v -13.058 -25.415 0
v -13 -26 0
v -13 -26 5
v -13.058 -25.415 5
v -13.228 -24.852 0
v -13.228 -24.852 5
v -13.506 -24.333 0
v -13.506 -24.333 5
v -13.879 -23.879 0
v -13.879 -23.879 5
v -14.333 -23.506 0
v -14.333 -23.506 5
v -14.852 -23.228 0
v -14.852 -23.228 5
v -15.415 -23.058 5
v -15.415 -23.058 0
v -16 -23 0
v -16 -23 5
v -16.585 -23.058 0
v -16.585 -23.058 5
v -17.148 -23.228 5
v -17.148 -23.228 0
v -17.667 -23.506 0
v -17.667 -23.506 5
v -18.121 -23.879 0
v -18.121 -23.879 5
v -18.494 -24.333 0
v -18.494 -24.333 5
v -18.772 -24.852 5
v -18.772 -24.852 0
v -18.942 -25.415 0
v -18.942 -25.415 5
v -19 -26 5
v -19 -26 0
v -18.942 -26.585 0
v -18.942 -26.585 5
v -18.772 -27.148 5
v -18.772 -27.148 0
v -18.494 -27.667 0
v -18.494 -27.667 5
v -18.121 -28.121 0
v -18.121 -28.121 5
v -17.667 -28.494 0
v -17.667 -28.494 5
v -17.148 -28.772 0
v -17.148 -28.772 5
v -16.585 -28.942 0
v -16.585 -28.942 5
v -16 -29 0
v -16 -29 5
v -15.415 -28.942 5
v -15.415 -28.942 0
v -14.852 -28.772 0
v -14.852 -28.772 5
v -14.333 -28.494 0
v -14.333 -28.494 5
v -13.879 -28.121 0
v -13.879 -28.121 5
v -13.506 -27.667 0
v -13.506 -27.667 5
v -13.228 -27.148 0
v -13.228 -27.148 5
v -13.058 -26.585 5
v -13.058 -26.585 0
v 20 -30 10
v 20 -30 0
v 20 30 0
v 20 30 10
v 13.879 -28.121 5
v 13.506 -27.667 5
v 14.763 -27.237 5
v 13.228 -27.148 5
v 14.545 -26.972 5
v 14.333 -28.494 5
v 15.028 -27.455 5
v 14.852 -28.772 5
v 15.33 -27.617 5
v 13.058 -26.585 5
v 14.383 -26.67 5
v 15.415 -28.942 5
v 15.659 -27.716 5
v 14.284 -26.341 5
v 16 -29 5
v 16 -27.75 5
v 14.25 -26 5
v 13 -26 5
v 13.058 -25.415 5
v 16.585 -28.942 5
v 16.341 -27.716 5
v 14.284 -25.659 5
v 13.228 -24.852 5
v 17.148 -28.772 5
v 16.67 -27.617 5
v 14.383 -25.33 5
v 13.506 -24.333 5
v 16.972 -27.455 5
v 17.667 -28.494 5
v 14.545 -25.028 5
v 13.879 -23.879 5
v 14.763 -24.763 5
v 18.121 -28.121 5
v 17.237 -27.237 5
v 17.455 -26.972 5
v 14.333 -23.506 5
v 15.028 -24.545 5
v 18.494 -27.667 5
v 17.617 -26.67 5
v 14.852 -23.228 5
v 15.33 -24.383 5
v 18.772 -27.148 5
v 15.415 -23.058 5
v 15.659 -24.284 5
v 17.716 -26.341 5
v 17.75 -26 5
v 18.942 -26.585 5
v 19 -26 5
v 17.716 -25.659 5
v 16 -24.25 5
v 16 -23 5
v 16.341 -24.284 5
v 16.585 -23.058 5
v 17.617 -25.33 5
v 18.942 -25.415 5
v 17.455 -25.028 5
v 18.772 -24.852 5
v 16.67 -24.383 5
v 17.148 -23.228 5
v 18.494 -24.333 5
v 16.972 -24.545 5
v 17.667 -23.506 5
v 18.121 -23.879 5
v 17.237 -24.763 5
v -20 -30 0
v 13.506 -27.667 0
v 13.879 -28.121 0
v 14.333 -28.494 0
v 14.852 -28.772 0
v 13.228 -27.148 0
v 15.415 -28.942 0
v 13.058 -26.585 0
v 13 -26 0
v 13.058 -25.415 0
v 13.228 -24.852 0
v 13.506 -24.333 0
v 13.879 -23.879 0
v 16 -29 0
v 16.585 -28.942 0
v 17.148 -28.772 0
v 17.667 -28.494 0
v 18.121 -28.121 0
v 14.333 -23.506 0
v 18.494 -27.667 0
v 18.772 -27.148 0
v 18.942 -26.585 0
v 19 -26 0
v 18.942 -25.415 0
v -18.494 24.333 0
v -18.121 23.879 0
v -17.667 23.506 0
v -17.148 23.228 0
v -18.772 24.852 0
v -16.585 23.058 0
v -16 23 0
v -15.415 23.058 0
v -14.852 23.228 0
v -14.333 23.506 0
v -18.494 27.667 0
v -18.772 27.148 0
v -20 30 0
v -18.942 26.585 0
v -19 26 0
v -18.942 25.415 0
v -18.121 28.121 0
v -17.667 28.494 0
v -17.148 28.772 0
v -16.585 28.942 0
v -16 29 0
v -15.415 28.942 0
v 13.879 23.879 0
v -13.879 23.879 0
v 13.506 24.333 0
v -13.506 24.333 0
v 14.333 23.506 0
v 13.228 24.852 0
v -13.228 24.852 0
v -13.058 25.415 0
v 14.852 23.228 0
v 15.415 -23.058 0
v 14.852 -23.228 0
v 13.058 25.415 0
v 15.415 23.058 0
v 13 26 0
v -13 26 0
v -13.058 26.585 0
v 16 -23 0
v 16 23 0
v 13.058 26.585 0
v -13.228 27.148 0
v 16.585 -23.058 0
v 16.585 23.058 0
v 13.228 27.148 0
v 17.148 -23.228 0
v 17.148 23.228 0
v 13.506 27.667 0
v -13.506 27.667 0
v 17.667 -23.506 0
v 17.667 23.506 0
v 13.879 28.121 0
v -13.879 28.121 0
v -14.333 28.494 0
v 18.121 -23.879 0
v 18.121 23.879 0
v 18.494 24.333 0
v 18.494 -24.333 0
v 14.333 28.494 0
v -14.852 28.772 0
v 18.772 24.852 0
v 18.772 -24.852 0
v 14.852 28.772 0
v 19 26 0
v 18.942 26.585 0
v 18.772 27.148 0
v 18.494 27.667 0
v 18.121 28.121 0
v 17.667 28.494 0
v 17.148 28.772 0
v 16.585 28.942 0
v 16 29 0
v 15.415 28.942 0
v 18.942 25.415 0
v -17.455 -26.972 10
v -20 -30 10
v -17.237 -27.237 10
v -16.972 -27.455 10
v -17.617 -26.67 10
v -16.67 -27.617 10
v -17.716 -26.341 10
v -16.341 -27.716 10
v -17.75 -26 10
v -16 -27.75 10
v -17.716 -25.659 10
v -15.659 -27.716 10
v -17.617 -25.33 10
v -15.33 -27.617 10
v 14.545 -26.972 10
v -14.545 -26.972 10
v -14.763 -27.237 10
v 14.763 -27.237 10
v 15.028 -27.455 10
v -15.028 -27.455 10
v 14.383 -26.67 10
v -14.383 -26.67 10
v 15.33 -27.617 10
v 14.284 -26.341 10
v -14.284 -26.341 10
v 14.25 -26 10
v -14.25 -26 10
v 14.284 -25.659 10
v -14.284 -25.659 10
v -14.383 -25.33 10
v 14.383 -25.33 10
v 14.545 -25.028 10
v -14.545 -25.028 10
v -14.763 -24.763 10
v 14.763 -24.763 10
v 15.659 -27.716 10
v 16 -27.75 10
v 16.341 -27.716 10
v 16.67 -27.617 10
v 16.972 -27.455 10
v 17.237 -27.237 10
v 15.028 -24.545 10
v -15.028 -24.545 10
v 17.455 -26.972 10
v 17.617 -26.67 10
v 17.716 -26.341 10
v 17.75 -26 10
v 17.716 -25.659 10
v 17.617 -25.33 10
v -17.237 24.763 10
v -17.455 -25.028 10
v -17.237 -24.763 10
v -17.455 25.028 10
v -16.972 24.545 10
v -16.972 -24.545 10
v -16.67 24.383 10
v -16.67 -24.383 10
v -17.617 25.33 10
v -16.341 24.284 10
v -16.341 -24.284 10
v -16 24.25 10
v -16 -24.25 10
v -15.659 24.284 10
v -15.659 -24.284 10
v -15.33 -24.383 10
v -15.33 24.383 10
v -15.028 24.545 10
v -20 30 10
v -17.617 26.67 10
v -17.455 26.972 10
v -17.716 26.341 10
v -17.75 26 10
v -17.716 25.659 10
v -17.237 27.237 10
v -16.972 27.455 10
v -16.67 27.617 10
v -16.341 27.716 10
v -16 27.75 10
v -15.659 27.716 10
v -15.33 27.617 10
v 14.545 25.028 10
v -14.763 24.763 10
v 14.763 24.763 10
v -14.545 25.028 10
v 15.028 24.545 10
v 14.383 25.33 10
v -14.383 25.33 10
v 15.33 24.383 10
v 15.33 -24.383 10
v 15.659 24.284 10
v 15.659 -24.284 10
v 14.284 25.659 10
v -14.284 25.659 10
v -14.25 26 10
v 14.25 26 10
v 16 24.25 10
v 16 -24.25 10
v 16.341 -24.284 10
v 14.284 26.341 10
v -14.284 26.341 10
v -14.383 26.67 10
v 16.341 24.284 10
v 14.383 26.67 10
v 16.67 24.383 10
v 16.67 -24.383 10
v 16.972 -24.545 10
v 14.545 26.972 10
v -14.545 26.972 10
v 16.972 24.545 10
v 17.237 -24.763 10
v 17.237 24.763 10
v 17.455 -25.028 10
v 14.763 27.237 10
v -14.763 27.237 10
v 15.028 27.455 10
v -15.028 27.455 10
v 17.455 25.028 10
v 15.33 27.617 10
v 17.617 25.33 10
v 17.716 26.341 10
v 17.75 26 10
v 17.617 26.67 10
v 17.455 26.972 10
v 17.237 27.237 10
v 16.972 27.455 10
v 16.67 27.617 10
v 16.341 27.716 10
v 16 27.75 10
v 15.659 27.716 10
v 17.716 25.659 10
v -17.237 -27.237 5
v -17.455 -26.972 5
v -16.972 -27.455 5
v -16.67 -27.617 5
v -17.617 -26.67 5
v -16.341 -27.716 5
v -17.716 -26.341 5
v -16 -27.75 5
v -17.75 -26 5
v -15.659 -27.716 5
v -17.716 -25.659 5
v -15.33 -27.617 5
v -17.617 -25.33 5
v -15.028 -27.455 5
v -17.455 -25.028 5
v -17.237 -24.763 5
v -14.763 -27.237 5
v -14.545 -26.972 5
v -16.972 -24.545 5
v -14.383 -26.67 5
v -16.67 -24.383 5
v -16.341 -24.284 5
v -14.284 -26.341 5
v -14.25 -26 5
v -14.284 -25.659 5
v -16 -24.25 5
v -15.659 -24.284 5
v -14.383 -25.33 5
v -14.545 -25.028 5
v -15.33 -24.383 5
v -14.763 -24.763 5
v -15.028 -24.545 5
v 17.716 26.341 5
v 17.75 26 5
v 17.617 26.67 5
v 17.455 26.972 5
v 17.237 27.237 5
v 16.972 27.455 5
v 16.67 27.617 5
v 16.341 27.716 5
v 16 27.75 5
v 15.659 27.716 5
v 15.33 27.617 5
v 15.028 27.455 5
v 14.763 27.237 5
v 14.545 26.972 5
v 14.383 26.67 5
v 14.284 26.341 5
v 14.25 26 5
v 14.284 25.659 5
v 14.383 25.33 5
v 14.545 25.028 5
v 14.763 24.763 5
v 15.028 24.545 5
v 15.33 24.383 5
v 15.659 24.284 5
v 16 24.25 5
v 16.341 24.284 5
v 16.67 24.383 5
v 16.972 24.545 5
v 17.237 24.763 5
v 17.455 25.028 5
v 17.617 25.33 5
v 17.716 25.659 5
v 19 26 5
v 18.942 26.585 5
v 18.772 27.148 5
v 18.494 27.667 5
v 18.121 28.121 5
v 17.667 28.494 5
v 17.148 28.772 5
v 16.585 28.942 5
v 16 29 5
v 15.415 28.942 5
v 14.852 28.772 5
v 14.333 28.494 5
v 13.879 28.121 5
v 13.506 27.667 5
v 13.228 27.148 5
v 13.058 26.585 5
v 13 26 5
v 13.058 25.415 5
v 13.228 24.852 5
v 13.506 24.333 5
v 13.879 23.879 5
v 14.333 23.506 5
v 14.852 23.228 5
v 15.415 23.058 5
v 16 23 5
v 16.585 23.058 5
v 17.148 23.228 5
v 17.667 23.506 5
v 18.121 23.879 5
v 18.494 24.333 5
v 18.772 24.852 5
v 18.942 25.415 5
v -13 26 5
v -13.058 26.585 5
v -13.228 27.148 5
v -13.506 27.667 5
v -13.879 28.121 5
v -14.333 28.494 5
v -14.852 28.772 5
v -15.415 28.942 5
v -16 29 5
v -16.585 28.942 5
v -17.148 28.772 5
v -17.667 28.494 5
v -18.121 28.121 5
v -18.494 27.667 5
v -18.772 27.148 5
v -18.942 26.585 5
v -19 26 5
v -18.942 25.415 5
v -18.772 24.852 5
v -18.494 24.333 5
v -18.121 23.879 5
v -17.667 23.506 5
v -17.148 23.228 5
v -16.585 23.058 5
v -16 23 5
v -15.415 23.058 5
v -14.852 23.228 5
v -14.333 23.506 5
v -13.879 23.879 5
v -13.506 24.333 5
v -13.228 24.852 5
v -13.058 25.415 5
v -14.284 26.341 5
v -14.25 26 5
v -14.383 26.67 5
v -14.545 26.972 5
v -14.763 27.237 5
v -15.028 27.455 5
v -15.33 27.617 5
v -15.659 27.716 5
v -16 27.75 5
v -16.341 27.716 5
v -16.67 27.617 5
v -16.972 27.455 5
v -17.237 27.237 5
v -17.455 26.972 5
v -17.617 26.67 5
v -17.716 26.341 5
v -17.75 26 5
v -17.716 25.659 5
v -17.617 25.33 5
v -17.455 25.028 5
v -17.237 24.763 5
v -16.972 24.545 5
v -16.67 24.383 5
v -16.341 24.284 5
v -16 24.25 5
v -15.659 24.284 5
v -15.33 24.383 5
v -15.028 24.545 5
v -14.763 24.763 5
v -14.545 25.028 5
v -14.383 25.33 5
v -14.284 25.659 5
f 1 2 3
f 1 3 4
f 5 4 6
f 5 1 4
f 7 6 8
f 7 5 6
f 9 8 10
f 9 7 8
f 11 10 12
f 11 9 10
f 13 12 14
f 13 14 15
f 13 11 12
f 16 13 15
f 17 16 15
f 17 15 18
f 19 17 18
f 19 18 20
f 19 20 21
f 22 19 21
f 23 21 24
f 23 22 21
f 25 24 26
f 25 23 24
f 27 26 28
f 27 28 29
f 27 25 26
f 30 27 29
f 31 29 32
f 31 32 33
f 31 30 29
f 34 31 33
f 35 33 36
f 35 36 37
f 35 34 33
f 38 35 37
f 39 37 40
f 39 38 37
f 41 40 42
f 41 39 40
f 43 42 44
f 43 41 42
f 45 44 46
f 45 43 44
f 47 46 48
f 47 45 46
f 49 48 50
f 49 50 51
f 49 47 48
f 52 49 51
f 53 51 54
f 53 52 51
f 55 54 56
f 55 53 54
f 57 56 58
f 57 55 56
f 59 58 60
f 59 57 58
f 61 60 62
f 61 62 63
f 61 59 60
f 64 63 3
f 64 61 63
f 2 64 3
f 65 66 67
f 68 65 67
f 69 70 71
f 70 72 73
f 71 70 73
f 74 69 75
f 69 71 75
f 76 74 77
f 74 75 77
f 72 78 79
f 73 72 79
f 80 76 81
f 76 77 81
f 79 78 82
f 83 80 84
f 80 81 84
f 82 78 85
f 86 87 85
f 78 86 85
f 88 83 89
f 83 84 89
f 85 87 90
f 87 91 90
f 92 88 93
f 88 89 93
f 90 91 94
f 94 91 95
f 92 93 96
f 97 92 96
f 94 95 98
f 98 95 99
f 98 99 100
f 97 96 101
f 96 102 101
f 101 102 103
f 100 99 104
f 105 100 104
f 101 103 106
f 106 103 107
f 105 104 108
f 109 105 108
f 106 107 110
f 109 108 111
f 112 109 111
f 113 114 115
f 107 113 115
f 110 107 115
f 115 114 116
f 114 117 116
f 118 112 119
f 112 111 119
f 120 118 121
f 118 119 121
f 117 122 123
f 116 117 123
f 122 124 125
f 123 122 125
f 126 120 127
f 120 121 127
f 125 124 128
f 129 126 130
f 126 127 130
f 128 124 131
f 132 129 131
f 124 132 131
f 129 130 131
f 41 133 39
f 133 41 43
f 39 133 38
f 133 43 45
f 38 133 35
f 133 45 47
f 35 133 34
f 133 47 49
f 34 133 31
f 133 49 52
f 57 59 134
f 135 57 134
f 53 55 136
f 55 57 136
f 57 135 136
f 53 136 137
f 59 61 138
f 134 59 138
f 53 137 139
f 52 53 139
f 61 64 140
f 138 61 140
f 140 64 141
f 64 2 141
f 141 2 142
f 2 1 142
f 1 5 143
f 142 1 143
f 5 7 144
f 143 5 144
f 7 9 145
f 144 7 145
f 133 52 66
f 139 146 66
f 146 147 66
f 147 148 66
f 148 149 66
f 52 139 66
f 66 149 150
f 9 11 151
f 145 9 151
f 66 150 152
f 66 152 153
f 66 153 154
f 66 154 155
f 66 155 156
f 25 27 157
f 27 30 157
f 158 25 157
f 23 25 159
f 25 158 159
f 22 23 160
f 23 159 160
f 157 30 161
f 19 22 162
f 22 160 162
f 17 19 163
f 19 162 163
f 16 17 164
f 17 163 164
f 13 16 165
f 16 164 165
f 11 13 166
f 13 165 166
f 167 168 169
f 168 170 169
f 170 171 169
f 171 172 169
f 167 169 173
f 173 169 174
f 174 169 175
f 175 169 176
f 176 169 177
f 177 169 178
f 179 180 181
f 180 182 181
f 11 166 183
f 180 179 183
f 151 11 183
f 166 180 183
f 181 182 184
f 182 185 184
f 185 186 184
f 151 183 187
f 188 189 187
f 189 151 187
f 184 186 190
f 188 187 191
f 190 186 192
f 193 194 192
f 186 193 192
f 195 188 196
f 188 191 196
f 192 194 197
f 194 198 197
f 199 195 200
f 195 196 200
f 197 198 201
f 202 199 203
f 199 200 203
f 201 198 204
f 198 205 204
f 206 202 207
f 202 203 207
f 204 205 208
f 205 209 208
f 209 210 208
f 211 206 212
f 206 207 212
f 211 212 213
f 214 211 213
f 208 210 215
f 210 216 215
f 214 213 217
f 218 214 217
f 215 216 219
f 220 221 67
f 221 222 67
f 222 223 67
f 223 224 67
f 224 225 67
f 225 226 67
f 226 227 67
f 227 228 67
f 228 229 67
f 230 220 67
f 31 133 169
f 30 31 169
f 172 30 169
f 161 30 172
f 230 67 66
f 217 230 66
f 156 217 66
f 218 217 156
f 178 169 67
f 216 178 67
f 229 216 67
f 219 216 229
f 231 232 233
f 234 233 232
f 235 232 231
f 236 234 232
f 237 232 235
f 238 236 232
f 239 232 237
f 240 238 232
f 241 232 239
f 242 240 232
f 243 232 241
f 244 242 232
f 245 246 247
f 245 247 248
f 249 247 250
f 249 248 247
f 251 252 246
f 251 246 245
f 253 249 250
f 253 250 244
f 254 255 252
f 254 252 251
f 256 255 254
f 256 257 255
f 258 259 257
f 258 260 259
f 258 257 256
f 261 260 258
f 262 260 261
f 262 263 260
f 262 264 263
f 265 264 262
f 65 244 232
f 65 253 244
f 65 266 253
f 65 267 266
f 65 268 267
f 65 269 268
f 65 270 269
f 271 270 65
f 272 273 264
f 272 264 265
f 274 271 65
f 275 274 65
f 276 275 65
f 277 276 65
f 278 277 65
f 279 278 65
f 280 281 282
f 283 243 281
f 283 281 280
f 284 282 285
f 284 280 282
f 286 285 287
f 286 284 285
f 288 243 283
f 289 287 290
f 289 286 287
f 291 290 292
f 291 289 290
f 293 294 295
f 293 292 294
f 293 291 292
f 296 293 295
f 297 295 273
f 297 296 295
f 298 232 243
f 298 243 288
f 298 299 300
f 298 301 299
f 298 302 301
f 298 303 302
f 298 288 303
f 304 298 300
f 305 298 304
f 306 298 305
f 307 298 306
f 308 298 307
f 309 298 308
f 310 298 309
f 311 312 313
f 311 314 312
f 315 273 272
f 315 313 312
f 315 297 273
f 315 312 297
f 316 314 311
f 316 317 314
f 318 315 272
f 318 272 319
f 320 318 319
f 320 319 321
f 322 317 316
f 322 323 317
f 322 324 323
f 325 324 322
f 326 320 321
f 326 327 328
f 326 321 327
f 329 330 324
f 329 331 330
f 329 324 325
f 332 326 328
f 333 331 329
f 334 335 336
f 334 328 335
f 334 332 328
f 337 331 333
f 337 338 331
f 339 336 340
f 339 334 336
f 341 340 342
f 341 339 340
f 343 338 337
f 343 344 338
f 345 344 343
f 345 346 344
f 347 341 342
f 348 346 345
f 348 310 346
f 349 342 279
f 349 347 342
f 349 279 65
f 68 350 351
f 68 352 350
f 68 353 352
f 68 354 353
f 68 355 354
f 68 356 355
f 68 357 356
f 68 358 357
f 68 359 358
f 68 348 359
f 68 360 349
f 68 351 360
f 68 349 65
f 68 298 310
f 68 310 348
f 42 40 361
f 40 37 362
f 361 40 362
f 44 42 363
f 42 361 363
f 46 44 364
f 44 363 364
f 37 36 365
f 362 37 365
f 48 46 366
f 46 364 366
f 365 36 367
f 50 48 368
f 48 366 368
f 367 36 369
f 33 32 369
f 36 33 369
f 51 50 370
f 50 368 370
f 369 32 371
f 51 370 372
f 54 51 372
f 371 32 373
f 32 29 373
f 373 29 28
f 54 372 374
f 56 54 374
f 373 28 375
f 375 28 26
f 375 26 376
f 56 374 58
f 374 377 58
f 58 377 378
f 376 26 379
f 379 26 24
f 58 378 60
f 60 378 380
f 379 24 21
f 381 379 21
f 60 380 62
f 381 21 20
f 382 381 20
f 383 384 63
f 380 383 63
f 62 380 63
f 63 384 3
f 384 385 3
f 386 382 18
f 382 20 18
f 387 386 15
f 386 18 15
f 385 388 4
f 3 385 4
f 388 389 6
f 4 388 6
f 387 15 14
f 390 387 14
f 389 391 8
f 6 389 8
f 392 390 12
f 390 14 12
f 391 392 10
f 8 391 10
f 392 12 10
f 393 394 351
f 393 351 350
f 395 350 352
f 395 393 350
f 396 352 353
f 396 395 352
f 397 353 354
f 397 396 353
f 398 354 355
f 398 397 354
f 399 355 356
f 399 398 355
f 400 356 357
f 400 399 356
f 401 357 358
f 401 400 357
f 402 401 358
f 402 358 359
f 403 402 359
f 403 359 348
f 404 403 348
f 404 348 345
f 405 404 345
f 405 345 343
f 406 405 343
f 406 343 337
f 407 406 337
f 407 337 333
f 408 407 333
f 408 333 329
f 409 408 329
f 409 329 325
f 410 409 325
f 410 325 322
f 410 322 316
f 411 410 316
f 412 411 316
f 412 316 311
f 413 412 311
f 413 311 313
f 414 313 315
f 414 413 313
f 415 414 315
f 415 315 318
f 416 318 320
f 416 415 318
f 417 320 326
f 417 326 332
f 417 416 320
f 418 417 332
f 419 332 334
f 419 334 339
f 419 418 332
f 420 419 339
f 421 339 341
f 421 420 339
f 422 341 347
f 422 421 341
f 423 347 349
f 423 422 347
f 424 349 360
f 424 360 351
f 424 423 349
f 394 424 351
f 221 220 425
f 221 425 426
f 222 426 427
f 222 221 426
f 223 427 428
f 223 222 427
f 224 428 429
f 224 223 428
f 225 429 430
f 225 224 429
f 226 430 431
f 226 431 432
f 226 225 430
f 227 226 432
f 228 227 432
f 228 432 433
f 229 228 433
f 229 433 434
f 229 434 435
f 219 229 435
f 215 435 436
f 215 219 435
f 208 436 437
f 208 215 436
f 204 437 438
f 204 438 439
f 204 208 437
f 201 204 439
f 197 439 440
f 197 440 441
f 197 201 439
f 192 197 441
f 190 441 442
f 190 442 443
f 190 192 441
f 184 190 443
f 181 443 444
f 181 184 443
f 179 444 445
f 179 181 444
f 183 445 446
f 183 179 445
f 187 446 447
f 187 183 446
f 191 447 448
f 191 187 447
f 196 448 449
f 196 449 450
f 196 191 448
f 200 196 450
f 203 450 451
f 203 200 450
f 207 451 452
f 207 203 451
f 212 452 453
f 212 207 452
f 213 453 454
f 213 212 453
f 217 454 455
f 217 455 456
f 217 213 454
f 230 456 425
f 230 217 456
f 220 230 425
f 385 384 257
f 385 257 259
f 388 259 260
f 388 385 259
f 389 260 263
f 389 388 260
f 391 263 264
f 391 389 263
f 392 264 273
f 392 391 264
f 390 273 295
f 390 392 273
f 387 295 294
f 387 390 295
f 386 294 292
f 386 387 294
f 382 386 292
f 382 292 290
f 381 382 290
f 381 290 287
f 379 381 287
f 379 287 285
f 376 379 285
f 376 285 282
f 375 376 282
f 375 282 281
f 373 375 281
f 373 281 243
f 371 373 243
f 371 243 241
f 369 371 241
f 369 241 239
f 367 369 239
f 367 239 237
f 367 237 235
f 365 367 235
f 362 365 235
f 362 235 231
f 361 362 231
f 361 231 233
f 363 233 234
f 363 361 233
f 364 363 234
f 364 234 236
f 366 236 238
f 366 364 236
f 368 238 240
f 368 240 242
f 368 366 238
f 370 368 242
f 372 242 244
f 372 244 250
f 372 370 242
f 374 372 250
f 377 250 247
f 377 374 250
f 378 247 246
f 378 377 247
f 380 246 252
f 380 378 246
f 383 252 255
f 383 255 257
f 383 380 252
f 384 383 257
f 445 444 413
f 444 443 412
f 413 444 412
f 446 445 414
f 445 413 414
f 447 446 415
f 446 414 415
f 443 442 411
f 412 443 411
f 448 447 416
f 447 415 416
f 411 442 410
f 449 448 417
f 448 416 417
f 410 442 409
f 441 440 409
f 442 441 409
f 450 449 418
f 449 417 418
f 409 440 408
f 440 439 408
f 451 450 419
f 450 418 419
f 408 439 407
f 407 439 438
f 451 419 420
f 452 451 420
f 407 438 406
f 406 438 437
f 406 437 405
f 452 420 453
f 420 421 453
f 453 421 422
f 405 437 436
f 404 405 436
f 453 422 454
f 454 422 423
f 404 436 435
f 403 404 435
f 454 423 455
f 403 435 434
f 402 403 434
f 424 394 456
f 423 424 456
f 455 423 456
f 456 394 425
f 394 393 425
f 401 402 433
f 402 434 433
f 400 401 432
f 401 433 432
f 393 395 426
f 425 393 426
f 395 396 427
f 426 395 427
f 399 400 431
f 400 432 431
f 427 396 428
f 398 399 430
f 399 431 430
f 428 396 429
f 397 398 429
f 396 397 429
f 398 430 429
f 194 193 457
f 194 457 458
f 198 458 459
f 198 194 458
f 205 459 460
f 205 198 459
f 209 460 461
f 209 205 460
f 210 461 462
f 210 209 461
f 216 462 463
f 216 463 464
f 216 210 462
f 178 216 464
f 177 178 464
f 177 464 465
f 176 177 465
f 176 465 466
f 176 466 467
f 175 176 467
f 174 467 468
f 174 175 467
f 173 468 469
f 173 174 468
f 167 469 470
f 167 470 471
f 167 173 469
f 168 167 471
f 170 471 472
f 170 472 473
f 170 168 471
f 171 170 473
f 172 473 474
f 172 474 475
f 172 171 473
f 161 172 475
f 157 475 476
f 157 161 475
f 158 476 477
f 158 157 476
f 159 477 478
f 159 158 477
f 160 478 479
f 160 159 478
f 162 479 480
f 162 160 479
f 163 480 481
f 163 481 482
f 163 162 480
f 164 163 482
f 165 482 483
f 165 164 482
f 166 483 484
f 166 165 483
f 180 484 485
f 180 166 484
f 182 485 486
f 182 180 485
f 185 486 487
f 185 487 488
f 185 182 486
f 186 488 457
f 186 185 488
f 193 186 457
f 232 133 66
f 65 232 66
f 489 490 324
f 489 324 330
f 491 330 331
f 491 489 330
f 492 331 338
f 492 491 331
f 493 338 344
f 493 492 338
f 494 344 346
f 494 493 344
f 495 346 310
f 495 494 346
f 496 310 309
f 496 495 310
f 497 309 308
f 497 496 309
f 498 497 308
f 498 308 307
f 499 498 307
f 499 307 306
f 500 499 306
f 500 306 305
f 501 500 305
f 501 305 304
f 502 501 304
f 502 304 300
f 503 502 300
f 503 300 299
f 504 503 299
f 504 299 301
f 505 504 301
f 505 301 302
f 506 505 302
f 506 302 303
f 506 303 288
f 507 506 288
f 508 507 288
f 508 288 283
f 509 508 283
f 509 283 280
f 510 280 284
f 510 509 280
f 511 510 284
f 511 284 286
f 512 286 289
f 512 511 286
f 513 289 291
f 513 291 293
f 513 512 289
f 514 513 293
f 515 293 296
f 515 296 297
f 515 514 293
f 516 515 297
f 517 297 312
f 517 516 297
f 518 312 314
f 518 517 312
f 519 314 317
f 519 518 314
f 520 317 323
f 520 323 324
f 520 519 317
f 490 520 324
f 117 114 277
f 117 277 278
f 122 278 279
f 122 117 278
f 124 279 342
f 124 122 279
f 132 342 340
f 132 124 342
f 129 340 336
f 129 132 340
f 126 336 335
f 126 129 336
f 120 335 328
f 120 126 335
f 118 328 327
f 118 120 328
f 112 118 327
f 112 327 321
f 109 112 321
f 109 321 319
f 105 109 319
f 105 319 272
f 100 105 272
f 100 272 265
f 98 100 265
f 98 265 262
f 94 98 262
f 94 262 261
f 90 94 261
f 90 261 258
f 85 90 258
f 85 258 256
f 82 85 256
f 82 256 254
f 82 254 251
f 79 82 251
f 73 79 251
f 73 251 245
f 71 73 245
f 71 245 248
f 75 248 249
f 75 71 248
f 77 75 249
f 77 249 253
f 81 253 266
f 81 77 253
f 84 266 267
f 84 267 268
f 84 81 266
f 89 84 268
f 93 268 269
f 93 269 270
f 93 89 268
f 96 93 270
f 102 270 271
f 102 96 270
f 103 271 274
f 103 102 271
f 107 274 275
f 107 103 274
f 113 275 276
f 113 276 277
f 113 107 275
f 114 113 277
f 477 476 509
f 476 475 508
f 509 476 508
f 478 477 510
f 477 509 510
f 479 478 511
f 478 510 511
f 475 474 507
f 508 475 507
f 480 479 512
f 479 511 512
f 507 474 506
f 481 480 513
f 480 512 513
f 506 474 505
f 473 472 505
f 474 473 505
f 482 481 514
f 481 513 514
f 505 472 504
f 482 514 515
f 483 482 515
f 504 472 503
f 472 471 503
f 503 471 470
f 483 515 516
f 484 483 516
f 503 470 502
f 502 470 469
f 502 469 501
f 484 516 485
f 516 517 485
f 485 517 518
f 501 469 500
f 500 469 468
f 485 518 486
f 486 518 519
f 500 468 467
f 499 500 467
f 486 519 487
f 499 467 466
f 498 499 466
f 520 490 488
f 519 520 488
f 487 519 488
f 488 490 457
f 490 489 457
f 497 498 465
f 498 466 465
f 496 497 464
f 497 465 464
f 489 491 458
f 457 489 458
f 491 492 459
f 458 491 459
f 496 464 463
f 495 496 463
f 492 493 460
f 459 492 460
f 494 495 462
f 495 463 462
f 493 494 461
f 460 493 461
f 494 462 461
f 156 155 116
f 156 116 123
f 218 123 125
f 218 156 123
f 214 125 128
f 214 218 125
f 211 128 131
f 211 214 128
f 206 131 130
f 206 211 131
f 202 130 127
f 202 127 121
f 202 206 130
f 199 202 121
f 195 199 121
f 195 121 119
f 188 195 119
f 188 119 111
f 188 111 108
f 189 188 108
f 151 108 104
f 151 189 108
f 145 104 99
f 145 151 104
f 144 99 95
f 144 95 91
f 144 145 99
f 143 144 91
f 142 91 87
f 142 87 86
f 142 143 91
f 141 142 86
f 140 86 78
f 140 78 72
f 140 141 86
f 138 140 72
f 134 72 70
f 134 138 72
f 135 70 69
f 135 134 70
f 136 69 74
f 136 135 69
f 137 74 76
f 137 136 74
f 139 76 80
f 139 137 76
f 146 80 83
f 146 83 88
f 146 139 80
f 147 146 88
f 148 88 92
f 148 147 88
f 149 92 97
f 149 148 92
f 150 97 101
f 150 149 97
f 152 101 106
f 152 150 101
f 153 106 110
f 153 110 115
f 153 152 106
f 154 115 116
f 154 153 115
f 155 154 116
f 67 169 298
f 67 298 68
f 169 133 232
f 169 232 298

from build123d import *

# Parameters (mm, degrees)
SKETCH1_W           = 40
SKETCH1_H           = 60
SKETCH1_R           = 1.75
BOSS_EXTRUDE1_DEPTH = 10
SKETCH3_R           = 3
CUT_EXTRUDE1_DEPTH  = 5


with BuildPart() as part:
    # Sketch1 → Boss-Extrude1 (new body)
    with BuildSketch(Plane.XY):
        Rectangle(SKETCH1_W, SKETCH1_H)
        with Locations((-16, 26)):
            Circle(SKETCH1_R, mode=Mode.SUBTRACT)
        with Locations((16, 26)):
            Circle(SKETCH1_R, mode=Mode.SUBTRACT)
        with Locations((16, -26)):
            Circle(SKETCH1_R, mode=Mode.SUBTRACT)
        with Locations((-16, -26)):
            Circle(SKETCH1_R, mode=Mode.SUBTRACT)
    extrude(amount=BOSS_EXTRUDE1_DEPTH)

    # Sketch3 → Cut-Extrude1 (cut)
    with BuildSketch(Plane.XY):
        with Locations((16, 26)):
            Circle(SKETCH3_R)
        with Locations((-16, 26)):
            Circle(SKETCH3_R)
        with Locations((16, -26)):
            Circle(SKETCH3_R)
        with Locations((-16, -26)):
            Circle(SKETCH3_R)
    extrude(amount=CUT_EXTRUDE1_DEPTH, mode=Mode.SUBTRACT)


solid = part.part
